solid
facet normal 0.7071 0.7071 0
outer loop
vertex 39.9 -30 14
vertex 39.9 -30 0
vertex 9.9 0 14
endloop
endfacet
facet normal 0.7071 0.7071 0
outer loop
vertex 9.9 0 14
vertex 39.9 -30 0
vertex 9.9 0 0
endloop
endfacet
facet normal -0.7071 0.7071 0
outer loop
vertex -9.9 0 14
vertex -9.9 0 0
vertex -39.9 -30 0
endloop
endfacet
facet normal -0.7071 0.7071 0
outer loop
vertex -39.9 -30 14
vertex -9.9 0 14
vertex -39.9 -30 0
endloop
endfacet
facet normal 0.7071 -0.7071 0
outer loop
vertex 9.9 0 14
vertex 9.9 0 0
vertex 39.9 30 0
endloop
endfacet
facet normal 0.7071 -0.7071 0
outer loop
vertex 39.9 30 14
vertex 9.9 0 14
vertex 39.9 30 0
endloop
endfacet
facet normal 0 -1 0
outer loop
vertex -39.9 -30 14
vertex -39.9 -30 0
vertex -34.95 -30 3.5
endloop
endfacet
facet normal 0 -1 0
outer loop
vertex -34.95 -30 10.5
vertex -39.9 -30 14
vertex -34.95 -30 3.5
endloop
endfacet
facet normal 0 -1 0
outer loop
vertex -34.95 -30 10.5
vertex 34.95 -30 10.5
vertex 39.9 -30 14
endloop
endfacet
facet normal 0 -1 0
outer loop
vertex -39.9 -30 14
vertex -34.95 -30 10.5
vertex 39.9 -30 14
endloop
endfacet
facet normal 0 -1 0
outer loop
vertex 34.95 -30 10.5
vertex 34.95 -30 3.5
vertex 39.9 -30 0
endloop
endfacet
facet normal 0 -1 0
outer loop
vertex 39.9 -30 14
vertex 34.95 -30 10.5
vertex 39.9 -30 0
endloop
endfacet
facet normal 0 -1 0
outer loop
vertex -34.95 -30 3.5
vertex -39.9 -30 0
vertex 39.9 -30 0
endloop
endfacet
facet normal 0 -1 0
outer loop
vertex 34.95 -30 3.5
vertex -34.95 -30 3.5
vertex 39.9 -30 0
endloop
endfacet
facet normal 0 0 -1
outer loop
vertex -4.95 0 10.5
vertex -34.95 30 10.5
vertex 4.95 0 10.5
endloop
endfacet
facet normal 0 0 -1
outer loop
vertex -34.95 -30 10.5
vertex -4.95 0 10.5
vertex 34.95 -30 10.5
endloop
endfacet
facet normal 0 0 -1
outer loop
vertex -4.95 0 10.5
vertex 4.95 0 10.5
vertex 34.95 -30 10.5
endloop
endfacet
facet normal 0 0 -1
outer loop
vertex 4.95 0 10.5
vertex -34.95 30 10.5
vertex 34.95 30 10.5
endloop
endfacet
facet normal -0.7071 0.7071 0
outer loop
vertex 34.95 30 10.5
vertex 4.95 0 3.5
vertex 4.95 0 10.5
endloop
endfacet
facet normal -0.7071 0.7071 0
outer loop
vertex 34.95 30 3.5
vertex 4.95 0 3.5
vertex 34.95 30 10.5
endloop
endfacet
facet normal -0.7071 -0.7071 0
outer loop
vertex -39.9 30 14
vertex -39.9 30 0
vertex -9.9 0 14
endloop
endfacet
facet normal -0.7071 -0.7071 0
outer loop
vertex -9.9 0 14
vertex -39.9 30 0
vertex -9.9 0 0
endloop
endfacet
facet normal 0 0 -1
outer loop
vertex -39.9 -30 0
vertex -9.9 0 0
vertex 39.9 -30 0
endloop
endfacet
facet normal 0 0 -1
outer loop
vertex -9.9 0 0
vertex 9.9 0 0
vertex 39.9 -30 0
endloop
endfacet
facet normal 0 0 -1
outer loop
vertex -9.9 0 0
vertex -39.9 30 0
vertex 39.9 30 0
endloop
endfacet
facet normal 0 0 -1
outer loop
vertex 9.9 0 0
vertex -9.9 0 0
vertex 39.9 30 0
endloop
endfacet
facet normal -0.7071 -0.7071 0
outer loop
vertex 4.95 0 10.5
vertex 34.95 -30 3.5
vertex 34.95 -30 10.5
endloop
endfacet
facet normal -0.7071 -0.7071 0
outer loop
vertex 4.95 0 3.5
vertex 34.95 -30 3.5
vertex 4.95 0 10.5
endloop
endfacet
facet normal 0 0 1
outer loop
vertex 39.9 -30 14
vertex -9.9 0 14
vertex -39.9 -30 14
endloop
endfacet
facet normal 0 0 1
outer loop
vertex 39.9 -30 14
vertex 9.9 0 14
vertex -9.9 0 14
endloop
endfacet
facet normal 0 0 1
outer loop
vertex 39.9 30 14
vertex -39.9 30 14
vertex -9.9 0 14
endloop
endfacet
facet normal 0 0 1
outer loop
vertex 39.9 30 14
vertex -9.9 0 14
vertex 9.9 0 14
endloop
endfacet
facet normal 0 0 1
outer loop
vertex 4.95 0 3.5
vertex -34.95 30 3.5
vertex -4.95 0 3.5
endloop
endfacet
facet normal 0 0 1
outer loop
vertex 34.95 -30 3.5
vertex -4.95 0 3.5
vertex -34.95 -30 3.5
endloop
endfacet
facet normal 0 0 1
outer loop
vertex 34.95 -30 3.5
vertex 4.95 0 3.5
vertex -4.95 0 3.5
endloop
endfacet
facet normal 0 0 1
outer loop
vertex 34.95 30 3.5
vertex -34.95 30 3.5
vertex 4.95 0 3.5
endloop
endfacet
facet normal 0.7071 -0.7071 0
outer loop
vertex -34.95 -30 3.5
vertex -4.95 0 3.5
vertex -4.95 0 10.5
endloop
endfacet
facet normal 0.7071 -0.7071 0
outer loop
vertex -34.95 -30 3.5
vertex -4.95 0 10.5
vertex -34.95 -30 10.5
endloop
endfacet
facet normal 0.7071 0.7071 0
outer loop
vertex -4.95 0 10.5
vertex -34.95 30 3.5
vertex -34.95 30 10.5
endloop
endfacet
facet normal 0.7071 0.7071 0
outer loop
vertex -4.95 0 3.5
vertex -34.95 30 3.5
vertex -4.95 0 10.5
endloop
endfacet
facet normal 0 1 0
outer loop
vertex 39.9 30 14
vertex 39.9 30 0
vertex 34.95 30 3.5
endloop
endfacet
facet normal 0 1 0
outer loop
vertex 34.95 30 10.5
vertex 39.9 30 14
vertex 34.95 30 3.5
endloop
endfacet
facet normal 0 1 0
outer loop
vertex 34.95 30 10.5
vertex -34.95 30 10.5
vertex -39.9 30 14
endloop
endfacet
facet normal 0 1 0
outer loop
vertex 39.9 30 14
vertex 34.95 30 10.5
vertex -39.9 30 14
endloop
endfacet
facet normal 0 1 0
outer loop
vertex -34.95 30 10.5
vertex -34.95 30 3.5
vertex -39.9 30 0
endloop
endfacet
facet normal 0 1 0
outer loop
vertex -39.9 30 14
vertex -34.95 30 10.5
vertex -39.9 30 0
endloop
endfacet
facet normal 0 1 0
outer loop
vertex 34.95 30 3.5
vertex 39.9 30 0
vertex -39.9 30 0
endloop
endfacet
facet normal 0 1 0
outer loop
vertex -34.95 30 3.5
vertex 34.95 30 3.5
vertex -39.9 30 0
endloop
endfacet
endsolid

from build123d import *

# Parameters (mm, degrees)
F1_DEPTH = 14
F2_T     = -3.5


with BuildPart() as f1:
    # F0 (on Top) → F1 (new body)
    with BuildSketch(Plane.XY):
        Polygon((39.8995, 30), (-39.8995, 30), (-9.8995, 0), (-39.8995, -30), (39.8995, -30), (9.8995, 0), align=None)
    extrude(amount=F1_DEPTH)

    # F2
    f2_openings = [f1.faces().sort_by_distance(p)[0] for p in [
        (0, -30, 7),
        (0, 30, 7),
    ]]
    offset(amount=F2_T, openings=f2_openings, kind=Kind.INTERSECTION)


solid = f1.part
